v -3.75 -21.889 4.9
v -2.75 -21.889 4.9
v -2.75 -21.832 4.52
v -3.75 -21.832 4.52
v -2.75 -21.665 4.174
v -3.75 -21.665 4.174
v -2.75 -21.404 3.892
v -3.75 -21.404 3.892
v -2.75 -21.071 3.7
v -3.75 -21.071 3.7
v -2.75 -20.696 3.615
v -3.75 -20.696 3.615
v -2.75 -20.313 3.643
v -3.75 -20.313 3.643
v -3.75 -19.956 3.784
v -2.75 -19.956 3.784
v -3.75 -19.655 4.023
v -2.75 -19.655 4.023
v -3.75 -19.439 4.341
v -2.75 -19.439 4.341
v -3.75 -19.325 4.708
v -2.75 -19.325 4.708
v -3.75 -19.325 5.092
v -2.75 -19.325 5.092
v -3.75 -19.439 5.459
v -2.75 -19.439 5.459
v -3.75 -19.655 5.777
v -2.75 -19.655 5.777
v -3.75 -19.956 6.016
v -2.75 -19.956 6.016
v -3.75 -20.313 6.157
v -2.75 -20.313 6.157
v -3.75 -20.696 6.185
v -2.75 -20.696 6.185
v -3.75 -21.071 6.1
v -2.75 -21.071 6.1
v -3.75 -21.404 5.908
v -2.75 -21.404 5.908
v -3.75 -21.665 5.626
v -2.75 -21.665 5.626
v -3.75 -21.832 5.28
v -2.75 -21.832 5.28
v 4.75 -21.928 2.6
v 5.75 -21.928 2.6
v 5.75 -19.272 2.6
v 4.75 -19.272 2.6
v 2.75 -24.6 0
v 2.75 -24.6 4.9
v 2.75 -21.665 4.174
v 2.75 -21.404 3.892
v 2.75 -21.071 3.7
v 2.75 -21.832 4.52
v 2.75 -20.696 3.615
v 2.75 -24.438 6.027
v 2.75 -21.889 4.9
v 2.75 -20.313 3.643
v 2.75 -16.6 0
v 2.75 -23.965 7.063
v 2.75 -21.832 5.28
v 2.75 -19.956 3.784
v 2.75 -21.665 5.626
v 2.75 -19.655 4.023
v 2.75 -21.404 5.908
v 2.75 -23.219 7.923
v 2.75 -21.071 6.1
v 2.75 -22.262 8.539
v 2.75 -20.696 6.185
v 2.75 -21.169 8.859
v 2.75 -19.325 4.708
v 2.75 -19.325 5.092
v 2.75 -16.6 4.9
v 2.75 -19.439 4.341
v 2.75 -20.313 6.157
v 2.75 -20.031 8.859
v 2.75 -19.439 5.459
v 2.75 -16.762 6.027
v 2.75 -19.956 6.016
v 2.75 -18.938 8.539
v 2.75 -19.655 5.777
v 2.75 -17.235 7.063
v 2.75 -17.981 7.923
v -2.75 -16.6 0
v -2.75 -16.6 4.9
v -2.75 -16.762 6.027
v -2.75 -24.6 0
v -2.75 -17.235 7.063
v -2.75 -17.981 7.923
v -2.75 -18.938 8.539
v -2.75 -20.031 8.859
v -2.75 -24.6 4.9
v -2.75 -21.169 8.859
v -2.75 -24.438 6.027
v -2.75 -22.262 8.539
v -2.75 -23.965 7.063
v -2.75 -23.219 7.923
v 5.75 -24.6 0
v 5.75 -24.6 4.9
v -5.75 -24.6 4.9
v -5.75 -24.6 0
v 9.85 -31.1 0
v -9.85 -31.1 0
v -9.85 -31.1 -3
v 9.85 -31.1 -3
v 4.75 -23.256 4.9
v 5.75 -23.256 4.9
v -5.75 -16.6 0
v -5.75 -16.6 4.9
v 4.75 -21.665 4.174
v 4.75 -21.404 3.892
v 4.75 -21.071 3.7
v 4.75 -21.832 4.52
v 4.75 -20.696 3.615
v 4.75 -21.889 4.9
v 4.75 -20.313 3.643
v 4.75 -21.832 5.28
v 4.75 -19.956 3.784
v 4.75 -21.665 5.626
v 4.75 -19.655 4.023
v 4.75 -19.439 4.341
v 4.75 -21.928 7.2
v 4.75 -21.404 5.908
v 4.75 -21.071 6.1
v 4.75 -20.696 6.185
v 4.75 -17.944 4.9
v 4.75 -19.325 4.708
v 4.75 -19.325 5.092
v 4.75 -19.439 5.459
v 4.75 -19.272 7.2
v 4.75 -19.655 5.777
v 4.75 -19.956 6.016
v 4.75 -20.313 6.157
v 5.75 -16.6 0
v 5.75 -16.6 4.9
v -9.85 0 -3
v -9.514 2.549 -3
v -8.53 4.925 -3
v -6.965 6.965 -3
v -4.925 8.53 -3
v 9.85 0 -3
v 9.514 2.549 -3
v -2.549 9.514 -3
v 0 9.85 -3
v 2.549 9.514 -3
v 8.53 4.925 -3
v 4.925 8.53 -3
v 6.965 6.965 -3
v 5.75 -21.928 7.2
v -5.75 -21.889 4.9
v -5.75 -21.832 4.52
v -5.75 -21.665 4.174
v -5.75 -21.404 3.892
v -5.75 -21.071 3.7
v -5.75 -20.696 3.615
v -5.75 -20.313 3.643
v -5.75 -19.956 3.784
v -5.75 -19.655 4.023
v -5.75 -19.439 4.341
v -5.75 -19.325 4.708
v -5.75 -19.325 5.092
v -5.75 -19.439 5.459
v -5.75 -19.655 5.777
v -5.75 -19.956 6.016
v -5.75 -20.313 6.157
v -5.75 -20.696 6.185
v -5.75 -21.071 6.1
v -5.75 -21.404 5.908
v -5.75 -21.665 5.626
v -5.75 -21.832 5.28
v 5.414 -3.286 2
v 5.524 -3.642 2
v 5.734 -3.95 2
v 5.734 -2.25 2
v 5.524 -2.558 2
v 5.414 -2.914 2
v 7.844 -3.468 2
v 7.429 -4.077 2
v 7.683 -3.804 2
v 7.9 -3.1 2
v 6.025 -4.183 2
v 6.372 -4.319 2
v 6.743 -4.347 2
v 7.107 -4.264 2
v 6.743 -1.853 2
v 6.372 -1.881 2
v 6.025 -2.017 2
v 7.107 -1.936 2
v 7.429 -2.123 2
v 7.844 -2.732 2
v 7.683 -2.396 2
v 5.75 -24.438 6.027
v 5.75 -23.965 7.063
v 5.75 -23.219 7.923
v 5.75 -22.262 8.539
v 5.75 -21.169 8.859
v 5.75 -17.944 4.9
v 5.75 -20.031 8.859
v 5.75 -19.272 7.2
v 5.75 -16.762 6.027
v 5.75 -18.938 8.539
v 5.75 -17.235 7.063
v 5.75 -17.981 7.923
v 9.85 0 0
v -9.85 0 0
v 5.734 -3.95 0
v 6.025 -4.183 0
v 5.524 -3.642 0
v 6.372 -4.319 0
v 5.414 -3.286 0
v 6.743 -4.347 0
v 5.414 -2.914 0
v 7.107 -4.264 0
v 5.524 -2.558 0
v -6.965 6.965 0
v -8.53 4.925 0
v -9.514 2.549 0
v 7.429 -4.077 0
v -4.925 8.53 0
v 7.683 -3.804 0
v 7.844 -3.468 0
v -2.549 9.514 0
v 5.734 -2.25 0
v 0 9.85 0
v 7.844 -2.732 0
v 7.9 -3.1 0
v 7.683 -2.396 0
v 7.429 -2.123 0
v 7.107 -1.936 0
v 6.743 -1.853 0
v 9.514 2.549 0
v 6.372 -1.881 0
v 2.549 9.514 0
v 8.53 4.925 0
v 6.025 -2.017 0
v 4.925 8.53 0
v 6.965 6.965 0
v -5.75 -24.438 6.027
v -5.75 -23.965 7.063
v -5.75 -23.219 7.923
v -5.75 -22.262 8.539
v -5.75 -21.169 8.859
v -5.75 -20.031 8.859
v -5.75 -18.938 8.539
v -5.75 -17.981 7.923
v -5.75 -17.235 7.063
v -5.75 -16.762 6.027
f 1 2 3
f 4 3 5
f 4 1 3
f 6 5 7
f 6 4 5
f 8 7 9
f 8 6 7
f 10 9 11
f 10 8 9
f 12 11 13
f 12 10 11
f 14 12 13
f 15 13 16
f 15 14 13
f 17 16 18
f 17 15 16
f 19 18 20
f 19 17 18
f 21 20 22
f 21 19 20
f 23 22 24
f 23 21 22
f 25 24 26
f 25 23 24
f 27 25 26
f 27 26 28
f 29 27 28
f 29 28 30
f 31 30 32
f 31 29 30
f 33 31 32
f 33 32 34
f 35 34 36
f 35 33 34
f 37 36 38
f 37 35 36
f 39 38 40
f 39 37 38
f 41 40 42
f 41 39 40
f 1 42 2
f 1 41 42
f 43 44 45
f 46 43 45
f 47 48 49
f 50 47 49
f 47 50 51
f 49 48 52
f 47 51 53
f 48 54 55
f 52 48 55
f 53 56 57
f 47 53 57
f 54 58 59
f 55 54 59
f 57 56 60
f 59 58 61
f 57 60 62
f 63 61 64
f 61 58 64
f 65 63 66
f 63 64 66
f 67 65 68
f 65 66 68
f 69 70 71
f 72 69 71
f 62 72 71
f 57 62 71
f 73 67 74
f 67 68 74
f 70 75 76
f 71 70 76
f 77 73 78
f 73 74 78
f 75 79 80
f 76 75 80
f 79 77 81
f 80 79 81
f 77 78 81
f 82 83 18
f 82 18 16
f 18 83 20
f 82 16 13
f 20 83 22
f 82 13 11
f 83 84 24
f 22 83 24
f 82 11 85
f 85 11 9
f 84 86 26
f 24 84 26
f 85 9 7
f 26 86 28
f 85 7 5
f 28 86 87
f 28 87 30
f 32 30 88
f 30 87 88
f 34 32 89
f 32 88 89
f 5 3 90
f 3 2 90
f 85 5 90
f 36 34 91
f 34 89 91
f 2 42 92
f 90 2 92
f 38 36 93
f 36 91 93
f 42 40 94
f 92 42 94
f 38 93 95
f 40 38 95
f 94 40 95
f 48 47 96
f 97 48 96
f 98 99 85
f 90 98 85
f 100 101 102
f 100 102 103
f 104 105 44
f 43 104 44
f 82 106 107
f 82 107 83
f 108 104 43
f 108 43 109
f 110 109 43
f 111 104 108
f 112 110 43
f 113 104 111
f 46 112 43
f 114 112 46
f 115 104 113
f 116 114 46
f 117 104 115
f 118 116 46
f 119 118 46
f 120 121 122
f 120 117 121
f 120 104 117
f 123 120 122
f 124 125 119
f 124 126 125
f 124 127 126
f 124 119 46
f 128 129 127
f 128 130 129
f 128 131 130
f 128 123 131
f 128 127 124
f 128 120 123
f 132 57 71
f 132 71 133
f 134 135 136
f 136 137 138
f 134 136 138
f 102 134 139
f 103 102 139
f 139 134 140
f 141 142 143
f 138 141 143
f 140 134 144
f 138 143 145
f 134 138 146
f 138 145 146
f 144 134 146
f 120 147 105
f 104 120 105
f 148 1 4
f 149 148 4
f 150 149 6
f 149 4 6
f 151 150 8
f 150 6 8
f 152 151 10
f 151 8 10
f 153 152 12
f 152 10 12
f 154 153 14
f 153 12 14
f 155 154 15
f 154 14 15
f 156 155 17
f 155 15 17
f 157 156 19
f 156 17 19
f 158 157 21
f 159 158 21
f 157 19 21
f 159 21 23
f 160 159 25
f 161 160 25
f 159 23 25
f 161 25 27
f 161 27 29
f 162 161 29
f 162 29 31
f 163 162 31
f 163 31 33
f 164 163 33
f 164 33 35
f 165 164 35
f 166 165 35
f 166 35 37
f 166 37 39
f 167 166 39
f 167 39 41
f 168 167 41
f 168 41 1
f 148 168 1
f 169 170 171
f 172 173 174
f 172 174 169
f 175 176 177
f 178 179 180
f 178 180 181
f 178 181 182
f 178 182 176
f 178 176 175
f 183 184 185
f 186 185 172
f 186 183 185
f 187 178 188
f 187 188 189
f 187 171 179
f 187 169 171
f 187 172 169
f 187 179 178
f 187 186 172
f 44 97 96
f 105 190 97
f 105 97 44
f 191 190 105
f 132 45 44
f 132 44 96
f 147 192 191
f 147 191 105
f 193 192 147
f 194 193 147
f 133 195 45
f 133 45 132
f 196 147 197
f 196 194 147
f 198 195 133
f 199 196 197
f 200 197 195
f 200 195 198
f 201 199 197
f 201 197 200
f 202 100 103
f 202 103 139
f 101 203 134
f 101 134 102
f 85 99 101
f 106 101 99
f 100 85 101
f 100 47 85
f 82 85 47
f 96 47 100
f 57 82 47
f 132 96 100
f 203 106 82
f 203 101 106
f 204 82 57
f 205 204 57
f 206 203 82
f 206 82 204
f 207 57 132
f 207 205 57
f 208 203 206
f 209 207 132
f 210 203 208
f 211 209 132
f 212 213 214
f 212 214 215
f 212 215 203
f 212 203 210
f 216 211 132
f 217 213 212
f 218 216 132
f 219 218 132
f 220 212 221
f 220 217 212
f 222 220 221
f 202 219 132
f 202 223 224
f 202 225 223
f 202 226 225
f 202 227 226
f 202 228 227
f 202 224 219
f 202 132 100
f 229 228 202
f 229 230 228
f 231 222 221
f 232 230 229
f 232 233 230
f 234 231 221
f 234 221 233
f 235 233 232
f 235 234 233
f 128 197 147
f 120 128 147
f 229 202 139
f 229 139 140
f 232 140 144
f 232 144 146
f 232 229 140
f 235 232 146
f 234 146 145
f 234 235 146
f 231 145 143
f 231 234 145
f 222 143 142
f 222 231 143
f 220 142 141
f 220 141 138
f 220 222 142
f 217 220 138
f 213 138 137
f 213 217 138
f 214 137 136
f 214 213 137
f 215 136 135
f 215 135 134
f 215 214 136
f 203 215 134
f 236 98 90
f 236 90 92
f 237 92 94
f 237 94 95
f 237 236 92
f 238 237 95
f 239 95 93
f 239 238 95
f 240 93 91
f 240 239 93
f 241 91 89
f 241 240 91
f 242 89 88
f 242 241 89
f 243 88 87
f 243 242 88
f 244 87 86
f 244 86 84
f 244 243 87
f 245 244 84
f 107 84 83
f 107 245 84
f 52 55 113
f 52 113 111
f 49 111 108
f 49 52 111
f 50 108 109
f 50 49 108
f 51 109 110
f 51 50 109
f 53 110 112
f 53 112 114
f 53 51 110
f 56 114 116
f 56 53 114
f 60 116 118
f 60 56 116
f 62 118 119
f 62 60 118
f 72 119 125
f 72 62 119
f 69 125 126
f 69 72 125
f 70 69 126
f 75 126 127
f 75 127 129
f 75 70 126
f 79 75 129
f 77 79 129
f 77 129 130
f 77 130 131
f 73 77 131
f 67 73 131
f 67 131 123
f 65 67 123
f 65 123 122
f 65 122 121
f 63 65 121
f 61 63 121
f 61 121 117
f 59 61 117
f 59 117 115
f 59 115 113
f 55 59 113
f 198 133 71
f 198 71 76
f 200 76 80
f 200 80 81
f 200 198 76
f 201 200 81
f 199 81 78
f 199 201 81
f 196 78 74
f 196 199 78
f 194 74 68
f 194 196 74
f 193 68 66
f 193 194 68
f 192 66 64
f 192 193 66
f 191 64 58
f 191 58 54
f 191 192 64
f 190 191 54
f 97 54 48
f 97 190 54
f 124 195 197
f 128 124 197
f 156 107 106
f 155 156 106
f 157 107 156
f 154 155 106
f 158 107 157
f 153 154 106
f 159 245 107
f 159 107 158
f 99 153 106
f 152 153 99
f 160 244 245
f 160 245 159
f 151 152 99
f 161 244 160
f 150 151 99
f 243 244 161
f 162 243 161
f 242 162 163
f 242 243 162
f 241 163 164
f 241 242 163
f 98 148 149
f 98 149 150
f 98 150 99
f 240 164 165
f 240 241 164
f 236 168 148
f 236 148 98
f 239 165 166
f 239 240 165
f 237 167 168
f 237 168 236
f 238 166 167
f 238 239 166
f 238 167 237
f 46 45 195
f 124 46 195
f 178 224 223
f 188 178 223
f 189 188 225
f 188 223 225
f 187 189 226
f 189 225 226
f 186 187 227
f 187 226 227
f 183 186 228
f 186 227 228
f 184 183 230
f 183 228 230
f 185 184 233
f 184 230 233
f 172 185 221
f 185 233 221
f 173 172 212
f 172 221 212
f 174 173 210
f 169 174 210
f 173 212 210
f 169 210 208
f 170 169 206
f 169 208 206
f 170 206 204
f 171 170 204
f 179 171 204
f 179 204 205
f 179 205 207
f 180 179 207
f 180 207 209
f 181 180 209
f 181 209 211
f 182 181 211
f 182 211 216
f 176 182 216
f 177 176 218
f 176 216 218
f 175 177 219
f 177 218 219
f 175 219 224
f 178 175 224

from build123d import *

# Parameters (mm, degrees)
F0_W      = 3
F0_H      = 8
F1_DEPTH  = 3
F2_DEPTH  = 4.9
F3_DEPTH  = 4.9
F5_DEPTH  = 3
F7_DEPTH  = 3
F8_DEPTH  = 25
F9_DEPTH  = 1
F11_DEPTH = 3
F12_R     = 1.8630386708
F13_DEPTH = 1
F14_R     = 1.9023250727
F15_DEPTH = 1
F16_R     = 1.25
F17_DEPTH = 2
F18_DEPTH = 25


with BuildPart() as f1:
    # F0 (on Top) → F1 (new body)
    with BuildSketch(Plane.XY):
        with BuildLine():
            Line((9.35, -30.6), (9.35, 0))
            ThreePointArc((9.35, 0), (0, -9.35), (-9.35, 0))
            Line((-9.35, 0), (-9.35, -30.6))
            Line((-9.35, -30.6), (9.35, -30.6))
        make_face()
        with Locations((-4.25, -20.6)):
            Rectangle(F0_W, F0_H, mode=Mode.SUBTRACT)
        with Locations((4.25, -20.6)):
            Rectangle(F0_W, F0_H, mode=Mode.SUBTRACT)
        with BuildLine():
            ThreePointArc((-9.35, 0), (0, -9.35), (9.35, 0))
            ThreePointArc((9.35, 0), (0, 9.35), (-9.35, 0))
        make_face()
        with Locations((4.25, -20.6)):
            Rectangle(F0_W, F0_H)
        with Locations((-4.25, -20.6)):
            Rectangle(F0_W, F0_H)
    extrude(amount=-F1_DEPTH)

    # F0 (on Top) → F2 (join)
    with BuildSketch(Plane.XY):
        with Locations((4.25, -20.6)):
            Rectangle(F0_W, F0_H)
    extrude(amount=F2_DEPTH)

    # F0 (on Top) → F3 (join)
    with BuildSketch(Plane.XY):
        with Locations((-4.25, -20.6)):
            Rectangle(F0_W, F0_H)
    extrude(amount=F3_DEPTH)

    # F4 (on face) → F5 (join)
    with BuildSketch(Plane(origin=(-5.75, 0, 0), x_dir=(0, -1, 0), z_dir=(-1, 0, 0))):
        with BuildLine():
            Line((16.6, 4.9), (24.6, 4.9))
            ThreePointArc((24.6, 4.9), (20.6, 8.9), (16.6, 4.9))
        make_face()
    extrude(amount=-F5_DEPTH)

    # F6 (on face) → F7 (join)
    with BuildSketch(Plane.YZ.offset(5.75)):
        with BuildLine():
            Line((-17.944, 4.9), (-16.6, 4.9))
            ThreePointArc((-16.6, 4.9), (-20.6, 8.9), (-24.6, 4.9))
            Line((-24.6, 4.9), (-23.256, 4.9))
            Line((-23.256, 4.9), (-21.928, 7.2001634725))
            Line((-21.928, 7.2001634725), (-19.272, 7.2001634725))
            Line((-19.272, 7.2001634725), (-17.944, 4.9))
        make_face()
        with BuildLine():
            Line((-19.311, 4.9), (-17.944, 4.9))
            Line((-17.944, 4.9), (-19.272, 7.2001634725))
            Line((-19.272, 7.2001634725), (-21.928, 7.2001634725))
            Line((-21.928, 7.2001634725), (-23.256, 4.9))
            Line((-23.256, 4.9), (-21.889, 4.9))
            ThreePointArc((-21.889, 4.9), (-20.6, 6.189), (-19.311, 4.9))
        make_face()
    extrude(amount=-F7_DEPTH)

    # F6 (on face) → F8 (cut)
    with BuildSketch(Plane.YZ.offset(5.75)):
        with BuildLine():
            Line((-21.889, 4.9), (-19.311, 4.9))
            ThreePointArc((-19.311, 4.9), (-20.6, 6.189), (-21.889, 4.9))
        make_face()
        with BuildLine():
            ThreePointArc((-21.889, 4.9), (-20.6, 3.611), (-19.311, 4.9))
            Line((-19.311, 4.9), (-21.889, 4.9))
        make_face()
    extrude(amount=-F8_DEPTH, mode=Mode.SUBTRACT)

    # F6 (on face) → F9 (cut)
    with BuildSketch(Plane.YZ.offset(5.75)):
        with BuildLine():
            Line((-19.311, 4.9), (-17.944, 4.9))
            Line((-17.944, 4.9), (-19.272, 7.2001634725))
            Line((-19.272, 7.2001634725), (-21.928, 7.2001634725))
            Line((-21.928, 7.2001634725), (-23.256, 4.9))
            Line((-23.256, 4.9), (-21.889, 4.9))
            ThreePointArc((-21.889, 4.9), (-20.6, 6.189), (-19.311, 4.9))
        make_face()
        with BuildLine():
            Line((-19.272, 2.5998365275), (-17.944, 4.9))
            Line((-17.944, 4.9), (-19.311, 4.9))
            ThreePointArc((-19.311, 4.9), (-20.6, 3.611), (-21.889, 4.9))
            Line((-21.889, 4.9), (-23.256, 4.9))
            Line((-23.256, 4.9), (-21.928, 2.5998365275))
            Line((-21.928, 2.5998365275), (-19.272, 2.5998365275))
        make_face()
    extrude(amount=-F9_DEPTH, mode=Mode.SUBTRACT)

    # F10 (on face) → F11 (join)
    with BuildSketch(Plane.XY):
        with BuildLine():
            Line((9.85, -31.1), (9.85, 0))
            ThreePointArc((9.85, 0), (0, 9.85), (-9.85, 0))
            Line((-9.85, 0), (-9.85, -31.1))
            Line((-9.85, -31.1), (9.85, -31.1))
        make_face()
        with BuildLine():
            Line((-9.35, -30.6), (-9.35, 0))
            ThreePointArc((-9.35, 0), (0, 9.35), (9.35, 0))
            Line((9.35, 0), (9.35, -30.6))
            Line((9.35, -30.6), (-9.35, -30.6))
        make_face(mode=Mode.SUBTRACT)
    extrude(amount=-F11_DEPTH)

    # F12 (on face) → F13 (join)
    with BuildSketch(Plane.YZ.offset(-2.75)):
        with Locations((-20.6, 4.9)):
            Circle(F12_R)
    extrude(amount=-F13_DEPTH)

    # F14 (on face) → F15 (join)
    with BuildSketch(Plane(origin=(2.75, 0, 0), x_dir=(0, -1, 0), z_dir=(-1, 0, 0))):
        with Locations((20.6, 4.9)):
            Circle(F14_R)
    extrude(amount=-F15_DEPTH)

    # F16 (on face) → F17 (join)
    with BuildSketch(Plane.XY):
        with Locations((6.65, -3.1)):
            Circle(F16_R)
    extrude(amount=F17_DEPTH)

    # F18 (cut): a face of the model
    f18_faces = [f1.faces().sort_by_distance(p)[0] for p in [
        (-3.75, -20.6, 4.9),
    ]]
    extrude(f18_faces, amount=-F18_DEPTH, mode=Mode.SUBTRACT)


solid = f1.part
